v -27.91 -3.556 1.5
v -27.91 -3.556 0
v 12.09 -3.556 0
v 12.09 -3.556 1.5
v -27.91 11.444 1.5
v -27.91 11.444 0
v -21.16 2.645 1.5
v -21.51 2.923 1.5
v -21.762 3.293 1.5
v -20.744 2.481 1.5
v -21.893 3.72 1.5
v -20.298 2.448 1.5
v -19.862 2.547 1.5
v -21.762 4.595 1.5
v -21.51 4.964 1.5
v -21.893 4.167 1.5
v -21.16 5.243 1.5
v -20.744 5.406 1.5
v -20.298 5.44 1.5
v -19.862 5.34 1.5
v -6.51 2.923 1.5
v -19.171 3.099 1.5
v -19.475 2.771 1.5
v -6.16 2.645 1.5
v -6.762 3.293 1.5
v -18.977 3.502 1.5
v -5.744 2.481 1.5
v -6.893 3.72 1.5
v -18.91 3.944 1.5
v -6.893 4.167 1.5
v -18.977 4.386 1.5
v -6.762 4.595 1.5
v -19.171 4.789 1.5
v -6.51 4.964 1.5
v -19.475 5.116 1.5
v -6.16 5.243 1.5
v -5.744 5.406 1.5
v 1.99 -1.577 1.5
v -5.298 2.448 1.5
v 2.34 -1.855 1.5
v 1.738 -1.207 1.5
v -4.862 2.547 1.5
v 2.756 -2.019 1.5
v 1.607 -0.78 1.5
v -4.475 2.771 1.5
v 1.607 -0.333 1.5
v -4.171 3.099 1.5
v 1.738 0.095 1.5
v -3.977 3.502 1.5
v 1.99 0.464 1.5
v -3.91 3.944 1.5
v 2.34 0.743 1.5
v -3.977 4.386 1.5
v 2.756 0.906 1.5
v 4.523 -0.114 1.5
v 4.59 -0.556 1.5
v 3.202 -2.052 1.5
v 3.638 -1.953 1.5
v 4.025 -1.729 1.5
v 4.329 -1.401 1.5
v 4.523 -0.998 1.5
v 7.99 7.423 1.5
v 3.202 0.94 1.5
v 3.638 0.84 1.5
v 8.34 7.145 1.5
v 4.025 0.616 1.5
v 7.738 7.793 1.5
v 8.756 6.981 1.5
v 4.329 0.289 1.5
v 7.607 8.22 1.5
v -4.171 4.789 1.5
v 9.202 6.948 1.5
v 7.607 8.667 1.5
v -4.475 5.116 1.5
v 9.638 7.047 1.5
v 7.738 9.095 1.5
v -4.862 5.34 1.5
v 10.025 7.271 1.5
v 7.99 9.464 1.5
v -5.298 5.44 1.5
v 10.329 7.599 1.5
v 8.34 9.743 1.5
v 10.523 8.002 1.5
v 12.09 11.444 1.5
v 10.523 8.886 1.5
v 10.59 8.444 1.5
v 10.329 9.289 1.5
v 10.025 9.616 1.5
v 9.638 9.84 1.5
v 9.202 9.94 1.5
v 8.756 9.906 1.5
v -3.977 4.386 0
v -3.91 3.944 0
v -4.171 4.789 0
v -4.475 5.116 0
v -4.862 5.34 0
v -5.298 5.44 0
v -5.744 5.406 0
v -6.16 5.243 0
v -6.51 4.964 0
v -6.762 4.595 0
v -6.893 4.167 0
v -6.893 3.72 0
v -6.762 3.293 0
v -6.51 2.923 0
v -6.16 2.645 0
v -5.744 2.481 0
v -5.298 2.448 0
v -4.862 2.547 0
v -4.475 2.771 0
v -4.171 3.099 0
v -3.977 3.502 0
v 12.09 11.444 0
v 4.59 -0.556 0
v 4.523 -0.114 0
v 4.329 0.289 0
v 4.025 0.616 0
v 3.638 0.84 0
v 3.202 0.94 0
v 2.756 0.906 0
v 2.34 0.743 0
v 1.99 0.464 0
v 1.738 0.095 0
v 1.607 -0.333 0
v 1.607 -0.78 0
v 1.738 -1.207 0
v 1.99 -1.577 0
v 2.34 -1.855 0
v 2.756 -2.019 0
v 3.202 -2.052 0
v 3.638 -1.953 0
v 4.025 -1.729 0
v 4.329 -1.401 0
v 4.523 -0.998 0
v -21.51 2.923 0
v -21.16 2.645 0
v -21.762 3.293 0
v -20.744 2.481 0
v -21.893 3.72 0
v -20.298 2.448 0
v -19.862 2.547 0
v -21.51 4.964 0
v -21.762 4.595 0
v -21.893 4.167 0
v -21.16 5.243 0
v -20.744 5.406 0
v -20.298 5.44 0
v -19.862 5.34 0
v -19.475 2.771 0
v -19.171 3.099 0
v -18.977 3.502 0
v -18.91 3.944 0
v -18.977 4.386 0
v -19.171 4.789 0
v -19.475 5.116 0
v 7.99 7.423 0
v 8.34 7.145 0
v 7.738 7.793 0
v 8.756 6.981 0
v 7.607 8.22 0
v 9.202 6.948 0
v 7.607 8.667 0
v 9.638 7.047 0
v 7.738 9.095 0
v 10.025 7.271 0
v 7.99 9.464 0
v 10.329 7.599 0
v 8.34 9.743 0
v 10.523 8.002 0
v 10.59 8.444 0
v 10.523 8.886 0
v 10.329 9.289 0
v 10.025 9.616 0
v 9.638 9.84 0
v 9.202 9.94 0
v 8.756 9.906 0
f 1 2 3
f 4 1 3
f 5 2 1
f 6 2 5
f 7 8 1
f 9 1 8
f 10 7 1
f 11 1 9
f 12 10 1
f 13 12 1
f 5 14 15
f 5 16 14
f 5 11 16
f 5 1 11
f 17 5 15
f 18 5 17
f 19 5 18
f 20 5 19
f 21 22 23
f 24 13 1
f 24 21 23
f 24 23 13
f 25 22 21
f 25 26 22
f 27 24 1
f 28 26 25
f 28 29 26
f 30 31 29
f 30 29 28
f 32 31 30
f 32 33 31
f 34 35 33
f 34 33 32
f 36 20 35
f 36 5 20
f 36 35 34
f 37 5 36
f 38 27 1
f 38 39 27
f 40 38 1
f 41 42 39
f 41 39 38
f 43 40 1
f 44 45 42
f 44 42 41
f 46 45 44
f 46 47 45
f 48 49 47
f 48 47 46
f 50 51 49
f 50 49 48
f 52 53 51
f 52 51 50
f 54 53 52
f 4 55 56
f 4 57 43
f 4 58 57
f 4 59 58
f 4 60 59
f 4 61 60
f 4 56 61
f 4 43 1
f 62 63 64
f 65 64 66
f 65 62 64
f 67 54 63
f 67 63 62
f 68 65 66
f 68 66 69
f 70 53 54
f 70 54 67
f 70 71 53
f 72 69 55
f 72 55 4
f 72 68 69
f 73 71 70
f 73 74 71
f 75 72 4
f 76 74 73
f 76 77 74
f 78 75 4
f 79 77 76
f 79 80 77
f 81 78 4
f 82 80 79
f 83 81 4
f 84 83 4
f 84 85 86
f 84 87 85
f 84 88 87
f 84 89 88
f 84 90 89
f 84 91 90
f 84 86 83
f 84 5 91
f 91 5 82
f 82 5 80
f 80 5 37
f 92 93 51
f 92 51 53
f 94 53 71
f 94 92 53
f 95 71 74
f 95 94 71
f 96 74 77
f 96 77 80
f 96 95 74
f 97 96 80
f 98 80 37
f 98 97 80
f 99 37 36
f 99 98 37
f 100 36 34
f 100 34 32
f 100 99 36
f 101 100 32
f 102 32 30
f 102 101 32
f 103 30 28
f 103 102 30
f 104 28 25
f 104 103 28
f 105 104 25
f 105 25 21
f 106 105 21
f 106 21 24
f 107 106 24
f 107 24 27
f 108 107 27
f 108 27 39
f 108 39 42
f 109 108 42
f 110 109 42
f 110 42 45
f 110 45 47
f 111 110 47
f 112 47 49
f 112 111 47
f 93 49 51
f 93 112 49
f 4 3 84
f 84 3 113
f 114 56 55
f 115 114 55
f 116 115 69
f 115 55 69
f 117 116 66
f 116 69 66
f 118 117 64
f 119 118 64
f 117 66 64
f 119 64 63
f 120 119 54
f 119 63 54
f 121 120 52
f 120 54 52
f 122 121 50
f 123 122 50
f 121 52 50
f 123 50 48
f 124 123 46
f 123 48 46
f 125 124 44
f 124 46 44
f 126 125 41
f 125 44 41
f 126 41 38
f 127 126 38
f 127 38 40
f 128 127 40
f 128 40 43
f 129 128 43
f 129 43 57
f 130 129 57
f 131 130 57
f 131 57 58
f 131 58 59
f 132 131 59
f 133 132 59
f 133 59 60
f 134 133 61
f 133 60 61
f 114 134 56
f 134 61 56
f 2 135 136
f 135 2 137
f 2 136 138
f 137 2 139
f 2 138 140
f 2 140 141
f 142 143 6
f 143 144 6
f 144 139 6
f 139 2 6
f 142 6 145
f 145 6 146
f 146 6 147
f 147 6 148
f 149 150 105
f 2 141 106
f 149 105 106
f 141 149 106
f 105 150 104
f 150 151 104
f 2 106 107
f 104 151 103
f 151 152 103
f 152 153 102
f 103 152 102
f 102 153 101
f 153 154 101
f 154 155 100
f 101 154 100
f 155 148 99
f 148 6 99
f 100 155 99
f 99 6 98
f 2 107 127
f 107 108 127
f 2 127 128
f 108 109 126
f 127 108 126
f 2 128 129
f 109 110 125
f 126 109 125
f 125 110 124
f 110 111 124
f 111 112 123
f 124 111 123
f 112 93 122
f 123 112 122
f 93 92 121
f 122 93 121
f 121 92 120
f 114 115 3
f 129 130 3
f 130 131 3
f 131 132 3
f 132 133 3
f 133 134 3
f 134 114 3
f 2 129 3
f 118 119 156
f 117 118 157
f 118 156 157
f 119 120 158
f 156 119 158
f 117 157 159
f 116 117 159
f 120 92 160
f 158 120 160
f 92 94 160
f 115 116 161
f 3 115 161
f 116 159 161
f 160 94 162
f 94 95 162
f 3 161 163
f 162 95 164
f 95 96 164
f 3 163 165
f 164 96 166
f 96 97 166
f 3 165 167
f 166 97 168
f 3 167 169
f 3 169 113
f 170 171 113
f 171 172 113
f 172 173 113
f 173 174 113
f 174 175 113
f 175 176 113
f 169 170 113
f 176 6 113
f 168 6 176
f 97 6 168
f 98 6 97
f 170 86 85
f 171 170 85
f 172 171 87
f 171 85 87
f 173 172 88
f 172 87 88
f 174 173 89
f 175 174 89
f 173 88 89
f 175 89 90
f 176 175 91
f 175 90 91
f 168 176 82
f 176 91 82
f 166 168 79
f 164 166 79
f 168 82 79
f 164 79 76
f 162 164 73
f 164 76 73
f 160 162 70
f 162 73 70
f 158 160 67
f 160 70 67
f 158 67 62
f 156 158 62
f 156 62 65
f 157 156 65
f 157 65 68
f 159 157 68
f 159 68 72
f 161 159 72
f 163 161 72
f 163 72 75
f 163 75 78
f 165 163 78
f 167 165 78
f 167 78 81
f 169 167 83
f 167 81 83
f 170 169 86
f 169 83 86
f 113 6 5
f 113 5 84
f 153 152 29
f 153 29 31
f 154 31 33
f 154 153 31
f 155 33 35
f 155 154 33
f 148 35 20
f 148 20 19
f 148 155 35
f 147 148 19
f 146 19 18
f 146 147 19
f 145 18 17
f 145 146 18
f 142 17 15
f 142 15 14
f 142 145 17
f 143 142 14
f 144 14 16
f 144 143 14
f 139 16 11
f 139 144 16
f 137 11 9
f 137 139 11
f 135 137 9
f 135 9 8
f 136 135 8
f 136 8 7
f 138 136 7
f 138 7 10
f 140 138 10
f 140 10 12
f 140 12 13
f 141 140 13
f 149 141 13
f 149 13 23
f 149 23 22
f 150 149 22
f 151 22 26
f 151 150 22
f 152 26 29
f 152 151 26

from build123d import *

# Parameters (mm, degrees)
ESQUISSE1_W      = 40
ESQUISSE1_H      = 15
ESQUISSE1_R      = 1.5
EXTRUSION1_DEPTH = 1.5
ESQUISSE2_R      = 1.5
EXTRUSION2_DEPTH = 1.5


with BuildPart() as part:
    # Esquisse1 → Extrusion1 (new body)
    with BuildSketch(Plane.XY):
        with Locations((-7.910187919, 3.943730074)):
            Rectangle(ESQUISSE1_W, ESQUISSE1_H)
        with Locations((-20.410187919, 3.943730074)):
            Circle(ESQUISSE1_R, mode=Mode.SUBTRACT)
        with Locations((-5.410187919, 3.943730074)):
            Circle(ESQUISSE1_R, mode=Mode.SUBTRACT)
    extrude(amount=EXTRUSION1_DEPTH)

    # Esquisse2 → Extrusion2 (cut)
    with BuildSketch(Plane.XY.offset(1.5)):
        with Locations((9.089812081, 8.443730074)):
            Circle(ESQUISSE2_R)
        with Locations((3.089812081, -0.556269926)):
            Circle(ESQUISSE2_R)
    extrude(amount=-EXTRUSION2_DEPTH, mode=Mode.SUBTRACT)


solid = part.part
